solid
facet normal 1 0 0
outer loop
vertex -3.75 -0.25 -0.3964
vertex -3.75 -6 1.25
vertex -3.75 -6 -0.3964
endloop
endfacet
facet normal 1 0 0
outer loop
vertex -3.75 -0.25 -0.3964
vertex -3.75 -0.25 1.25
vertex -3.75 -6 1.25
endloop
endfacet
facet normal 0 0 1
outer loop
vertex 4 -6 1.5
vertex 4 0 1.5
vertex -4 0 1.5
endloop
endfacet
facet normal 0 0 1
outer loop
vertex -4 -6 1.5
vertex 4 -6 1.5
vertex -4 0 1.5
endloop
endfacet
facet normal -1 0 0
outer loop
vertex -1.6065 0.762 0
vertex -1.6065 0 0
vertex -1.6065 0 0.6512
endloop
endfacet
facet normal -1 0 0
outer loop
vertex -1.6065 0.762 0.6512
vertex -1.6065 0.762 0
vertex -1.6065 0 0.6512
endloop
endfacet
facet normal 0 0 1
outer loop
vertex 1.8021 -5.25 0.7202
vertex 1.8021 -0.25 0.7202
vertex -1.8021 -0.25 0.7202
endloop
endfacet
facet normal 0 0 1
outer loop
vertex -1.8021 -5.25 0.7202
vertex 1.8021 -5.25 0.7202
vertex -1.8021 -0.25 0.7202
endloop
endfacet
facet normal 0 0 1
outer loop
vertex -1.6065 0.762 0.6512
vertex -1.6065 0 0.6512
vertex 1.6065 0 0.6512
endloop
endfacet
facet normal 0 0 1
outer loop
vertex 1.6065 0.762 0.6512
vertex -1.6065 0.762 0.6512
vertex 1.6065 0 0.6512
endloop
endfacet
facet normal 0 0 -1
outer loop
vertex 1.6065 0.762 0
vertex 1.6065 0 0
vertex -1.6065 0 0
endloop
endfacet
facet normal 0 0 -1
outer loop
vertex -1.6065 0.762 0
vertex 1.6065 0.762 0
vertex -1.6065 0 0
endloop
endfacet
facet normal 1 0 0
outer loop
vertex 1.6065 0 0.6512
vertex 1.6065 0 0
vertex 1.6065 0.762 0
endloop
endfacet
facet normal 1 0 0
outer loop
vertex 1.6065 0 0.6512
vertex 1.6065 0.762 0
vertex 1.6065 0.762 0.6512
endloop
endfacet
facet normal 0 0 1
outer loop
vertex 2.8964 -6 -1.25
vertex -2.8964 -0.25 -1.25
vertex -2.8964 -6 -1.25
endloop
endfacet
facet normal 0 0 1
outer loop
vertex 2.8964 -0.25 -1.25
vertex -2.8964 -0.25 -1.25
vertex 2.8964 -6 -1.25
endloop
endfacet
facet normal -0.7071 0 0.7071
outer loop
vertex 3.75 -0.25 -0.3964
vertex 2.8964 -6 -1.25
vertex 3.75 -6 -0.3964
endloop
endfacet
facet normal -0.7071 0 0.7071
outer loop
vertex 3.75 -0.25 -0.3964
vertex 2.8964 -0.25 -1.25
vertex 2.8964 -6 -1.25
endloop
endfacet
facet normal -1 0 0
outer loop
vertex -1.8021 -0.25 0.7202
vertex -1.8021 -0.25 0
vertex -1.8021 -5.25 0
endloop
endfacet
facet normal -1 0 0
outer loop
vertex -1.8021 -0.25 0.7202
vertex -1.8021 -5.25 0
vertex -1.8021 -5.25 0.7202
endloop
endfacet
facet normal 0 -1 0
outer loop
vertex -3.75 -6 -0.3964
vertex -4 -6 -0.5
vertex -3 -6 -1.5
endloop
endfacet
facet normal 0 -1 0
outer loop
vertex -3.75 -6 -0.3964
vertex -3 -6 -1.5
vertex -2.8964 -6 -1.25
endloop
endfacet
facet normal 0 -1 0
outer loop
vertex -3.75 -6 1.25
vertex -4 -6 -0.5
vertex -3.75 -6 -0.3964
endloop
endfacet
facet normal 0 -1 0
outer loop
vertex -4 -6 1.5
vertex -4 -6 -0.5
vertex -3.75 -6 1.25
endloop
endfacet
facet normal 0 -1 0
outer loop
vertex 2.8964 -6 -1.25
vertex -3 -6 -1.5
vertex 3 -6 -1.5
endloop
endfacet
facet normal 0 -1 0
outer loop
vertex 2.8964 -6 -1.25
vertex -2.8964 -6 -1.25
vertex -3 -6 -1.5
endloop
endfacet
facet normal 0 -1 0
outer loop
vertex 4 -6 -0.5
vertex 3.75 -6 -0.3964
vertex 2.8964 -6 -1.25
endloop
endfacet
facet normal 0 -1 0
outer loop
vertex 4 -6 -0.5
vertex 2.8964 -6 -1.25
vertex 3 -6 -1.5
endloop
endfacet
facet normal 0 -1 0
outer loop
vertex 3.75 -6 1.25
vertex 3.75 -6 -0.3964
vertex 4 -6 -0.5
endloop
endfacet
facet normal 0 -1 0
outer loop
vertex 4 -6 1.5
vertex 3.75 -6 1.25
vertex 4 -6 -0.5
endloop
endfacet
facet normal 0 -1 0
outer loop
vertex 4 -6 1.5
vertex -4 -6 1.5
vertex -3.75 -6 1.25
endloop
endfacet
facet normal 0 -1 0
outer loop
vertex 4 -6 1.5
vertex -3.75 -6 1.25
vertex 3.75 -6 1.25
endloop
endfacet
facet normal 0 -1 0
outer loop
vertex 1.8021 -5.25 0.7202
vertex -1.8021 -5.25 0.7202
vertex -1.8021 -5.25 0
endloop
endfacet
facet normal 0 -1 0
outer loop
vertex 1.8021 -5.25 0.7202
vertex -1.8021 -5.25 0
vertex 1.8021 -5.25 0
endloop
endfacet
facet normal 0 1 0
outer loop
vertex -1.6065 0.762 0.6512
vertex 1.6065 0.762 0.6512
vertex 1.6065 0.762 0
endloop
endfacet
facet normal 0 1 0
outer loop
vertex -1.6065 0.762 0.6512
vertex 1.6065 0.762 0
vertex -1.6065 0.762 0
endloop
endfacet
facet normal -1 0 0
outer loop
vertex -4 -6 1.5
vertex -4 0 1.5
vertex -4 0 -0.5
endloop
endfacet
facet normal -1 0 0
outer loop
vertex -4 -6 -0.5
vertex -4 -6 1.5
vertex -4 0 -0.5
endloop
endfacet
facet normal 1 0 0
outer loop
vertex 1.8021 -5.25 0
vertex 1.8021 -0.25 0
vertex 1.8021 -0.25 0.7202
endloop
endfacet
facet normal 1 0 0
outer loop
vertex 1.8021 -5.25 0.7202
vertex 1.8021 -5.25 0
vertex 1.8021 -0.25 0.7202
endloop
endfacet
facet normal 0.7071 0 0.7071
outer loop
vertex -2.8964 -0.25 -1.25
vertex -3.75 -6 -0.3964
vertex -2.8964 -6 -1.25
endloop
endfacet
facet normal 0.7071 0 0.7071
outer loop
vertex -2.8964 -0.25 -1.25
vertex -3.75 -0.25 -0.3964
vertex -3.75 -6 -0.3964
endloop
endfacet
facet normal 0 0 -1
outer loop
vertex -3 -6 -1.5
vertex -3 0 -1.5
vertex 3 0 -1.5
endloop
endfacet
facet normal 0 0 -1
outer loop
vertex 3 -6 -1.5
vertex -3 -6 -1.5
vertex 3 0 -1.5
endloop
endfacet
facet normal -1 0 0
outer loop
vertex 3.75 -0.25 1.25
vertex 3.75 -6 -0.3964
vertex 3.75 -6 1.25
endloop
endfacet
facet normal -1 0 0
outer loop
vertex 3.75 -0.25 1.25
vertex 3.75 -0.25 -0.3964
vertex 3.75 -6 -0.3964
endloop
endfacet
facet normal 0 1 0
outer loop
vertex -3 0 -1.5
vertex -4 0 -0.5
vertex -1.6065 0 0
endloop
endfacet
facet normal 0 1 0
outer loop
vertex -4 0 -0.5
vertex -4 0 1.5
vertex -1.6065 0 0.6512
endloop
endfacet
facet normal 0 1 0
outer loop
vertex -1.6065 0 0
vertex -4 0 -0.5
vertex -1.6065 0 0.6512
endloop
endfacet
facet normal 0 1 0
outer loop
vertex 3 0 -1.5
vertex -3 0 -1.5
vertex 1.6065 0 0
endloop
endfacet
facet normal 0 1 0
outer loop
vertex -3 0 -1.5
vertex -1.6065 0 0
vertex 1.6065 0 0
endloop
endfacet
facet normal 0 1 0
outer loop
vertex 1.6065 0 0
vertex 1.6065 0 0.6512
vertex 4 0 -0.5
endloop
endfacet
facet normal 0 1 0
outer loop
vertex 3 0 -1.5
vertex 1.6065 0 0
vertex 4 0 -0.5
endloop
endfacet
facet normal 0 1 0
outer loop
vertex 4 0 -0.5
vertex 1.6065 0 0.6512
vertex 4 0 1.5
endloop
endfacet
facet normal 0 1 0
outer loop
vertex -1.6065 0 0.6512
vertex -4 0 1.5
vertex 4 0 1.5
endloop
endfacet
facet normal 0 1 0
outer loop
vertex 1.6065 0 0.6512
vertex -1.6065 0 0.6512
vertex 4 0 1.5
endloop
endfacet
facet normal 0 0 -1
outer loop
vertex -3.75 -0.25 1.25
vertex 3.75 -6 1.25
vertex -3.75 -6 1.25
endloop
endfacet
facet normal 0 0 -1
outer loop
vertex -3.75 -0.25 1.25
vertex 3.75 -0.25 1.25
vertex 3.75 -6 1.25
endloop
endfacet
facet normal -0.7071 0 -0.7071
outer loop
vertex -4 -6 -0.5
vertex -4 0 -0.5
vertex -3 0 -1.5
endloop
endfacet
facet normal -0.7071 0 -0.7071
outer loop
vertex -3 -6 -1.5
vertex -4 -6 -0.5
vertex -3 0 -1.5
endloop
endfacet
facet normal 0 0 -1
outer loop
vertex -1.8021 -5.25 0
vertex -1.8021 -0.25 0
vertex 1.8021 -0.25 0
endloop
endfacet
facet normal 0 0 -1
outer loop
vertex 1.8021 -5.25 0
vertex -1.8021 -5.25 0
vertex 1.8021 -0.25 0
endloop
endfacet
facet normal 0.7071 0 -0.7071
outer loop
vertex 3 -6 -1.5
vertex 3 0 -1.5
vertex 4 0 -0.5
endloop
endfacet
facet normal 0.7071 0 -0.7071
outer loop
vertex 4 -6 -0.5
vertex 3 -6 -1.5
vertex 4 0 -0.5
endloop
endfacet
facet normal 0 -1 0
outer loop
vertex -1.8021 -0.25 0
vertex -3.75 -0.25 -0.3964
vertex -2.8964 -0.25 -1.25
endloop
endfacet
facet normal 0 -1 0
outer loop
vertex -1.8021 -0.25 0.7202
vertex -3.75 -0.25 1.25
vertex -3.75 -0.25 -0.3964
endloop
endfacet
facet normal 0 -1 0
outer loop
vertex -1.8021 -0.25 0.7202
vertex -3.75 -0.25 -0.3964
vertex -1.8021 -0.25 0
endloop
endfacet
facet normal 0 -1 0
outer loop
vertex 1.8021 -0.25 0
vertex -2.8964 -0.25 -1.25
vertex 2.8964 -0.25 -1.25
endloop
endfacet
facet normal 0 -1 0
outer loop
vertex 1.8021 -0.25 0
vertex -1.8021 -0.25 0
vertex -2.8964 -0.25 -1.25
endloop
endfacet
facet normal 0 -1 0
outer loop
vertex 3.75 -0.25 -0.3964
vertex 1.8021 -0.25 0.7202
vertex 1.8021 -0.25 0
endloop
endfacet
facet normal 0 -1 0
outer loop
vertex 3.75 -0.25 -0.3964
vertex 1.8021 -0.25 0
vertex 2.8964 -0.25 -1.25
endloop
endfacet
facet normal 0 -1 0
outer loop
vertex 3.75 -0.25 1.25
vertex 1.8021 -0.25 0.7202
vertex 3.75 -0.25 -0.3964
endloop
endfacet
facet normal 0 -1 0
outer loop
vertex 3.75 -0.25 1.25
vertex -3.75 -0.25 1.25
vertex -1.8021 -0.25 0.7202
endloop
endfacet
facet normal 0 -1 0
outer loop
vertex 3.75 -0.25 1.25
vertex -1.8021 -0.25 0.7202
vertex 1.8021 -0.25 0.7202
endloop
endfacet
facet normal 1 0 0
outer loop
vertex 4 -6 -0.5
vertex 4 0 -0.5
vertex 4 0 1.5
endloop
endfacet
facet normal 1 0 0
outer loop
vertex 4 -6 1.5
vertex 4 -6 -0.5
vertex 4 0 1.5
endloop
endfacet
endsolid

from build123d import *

# Parameters (mm, degrees)
F1_DEPTH = 6
F2_T     = -0.25
F3_W     = 1.8021183787
F3_H     = 0.7201734115
F4_DEPTH = 5
F5_W     = 1.6065204982
F5_H     = 0.6512082182
F6_DEPTH = 0.762


with BuildPart() as f1:
    # F0 (on Front) → F1 (new body)
    with BuildSketch(Plane.XZ):
        Polygon((4, -0.5), (4, 1.5), (-4, 1.5), (-4, -0.5), (-3, -1.5), (3, -1.5), align=None)
    extrude(amount=F1_DEPTH)

    # F2
    f2_openings = [f1.faces().sort_by_distance(p)[0] for p in [
        (0, -6, 0.050725),
    ]]
    offset(amount=F2_T, openings=f2_openings)

    # F3 (on face) → F4 (join)
    with BuildSketch(Plane.XZ.offset(0.25)):
        with Locations((-0.9010591893, 0.3600867058)):
            Rectangle(F3_W, F3_H)
        with Locations((0.9010591893, 0.3600867058)):
            Rectangle(F3_W, F3_H)
    extrude(amount=F4_DEPTH)

    # F5 (on face) → F6 (join)
    with BuildSketch(Plane(origin=(0, 0, 0), x_dir=(-1, 0, 0), z_dir=(0, 1, 0))):
        with Locations((0.8032602491, 0.3256041091)):
            Rectangle(F5_W, F5_H)
        with Locations((-0.8032602491, 0.3256041091)):
            Rectangle(F5_W, F5_H)
    extrude(amount=F6_DEPTH)


solid = f1.part
